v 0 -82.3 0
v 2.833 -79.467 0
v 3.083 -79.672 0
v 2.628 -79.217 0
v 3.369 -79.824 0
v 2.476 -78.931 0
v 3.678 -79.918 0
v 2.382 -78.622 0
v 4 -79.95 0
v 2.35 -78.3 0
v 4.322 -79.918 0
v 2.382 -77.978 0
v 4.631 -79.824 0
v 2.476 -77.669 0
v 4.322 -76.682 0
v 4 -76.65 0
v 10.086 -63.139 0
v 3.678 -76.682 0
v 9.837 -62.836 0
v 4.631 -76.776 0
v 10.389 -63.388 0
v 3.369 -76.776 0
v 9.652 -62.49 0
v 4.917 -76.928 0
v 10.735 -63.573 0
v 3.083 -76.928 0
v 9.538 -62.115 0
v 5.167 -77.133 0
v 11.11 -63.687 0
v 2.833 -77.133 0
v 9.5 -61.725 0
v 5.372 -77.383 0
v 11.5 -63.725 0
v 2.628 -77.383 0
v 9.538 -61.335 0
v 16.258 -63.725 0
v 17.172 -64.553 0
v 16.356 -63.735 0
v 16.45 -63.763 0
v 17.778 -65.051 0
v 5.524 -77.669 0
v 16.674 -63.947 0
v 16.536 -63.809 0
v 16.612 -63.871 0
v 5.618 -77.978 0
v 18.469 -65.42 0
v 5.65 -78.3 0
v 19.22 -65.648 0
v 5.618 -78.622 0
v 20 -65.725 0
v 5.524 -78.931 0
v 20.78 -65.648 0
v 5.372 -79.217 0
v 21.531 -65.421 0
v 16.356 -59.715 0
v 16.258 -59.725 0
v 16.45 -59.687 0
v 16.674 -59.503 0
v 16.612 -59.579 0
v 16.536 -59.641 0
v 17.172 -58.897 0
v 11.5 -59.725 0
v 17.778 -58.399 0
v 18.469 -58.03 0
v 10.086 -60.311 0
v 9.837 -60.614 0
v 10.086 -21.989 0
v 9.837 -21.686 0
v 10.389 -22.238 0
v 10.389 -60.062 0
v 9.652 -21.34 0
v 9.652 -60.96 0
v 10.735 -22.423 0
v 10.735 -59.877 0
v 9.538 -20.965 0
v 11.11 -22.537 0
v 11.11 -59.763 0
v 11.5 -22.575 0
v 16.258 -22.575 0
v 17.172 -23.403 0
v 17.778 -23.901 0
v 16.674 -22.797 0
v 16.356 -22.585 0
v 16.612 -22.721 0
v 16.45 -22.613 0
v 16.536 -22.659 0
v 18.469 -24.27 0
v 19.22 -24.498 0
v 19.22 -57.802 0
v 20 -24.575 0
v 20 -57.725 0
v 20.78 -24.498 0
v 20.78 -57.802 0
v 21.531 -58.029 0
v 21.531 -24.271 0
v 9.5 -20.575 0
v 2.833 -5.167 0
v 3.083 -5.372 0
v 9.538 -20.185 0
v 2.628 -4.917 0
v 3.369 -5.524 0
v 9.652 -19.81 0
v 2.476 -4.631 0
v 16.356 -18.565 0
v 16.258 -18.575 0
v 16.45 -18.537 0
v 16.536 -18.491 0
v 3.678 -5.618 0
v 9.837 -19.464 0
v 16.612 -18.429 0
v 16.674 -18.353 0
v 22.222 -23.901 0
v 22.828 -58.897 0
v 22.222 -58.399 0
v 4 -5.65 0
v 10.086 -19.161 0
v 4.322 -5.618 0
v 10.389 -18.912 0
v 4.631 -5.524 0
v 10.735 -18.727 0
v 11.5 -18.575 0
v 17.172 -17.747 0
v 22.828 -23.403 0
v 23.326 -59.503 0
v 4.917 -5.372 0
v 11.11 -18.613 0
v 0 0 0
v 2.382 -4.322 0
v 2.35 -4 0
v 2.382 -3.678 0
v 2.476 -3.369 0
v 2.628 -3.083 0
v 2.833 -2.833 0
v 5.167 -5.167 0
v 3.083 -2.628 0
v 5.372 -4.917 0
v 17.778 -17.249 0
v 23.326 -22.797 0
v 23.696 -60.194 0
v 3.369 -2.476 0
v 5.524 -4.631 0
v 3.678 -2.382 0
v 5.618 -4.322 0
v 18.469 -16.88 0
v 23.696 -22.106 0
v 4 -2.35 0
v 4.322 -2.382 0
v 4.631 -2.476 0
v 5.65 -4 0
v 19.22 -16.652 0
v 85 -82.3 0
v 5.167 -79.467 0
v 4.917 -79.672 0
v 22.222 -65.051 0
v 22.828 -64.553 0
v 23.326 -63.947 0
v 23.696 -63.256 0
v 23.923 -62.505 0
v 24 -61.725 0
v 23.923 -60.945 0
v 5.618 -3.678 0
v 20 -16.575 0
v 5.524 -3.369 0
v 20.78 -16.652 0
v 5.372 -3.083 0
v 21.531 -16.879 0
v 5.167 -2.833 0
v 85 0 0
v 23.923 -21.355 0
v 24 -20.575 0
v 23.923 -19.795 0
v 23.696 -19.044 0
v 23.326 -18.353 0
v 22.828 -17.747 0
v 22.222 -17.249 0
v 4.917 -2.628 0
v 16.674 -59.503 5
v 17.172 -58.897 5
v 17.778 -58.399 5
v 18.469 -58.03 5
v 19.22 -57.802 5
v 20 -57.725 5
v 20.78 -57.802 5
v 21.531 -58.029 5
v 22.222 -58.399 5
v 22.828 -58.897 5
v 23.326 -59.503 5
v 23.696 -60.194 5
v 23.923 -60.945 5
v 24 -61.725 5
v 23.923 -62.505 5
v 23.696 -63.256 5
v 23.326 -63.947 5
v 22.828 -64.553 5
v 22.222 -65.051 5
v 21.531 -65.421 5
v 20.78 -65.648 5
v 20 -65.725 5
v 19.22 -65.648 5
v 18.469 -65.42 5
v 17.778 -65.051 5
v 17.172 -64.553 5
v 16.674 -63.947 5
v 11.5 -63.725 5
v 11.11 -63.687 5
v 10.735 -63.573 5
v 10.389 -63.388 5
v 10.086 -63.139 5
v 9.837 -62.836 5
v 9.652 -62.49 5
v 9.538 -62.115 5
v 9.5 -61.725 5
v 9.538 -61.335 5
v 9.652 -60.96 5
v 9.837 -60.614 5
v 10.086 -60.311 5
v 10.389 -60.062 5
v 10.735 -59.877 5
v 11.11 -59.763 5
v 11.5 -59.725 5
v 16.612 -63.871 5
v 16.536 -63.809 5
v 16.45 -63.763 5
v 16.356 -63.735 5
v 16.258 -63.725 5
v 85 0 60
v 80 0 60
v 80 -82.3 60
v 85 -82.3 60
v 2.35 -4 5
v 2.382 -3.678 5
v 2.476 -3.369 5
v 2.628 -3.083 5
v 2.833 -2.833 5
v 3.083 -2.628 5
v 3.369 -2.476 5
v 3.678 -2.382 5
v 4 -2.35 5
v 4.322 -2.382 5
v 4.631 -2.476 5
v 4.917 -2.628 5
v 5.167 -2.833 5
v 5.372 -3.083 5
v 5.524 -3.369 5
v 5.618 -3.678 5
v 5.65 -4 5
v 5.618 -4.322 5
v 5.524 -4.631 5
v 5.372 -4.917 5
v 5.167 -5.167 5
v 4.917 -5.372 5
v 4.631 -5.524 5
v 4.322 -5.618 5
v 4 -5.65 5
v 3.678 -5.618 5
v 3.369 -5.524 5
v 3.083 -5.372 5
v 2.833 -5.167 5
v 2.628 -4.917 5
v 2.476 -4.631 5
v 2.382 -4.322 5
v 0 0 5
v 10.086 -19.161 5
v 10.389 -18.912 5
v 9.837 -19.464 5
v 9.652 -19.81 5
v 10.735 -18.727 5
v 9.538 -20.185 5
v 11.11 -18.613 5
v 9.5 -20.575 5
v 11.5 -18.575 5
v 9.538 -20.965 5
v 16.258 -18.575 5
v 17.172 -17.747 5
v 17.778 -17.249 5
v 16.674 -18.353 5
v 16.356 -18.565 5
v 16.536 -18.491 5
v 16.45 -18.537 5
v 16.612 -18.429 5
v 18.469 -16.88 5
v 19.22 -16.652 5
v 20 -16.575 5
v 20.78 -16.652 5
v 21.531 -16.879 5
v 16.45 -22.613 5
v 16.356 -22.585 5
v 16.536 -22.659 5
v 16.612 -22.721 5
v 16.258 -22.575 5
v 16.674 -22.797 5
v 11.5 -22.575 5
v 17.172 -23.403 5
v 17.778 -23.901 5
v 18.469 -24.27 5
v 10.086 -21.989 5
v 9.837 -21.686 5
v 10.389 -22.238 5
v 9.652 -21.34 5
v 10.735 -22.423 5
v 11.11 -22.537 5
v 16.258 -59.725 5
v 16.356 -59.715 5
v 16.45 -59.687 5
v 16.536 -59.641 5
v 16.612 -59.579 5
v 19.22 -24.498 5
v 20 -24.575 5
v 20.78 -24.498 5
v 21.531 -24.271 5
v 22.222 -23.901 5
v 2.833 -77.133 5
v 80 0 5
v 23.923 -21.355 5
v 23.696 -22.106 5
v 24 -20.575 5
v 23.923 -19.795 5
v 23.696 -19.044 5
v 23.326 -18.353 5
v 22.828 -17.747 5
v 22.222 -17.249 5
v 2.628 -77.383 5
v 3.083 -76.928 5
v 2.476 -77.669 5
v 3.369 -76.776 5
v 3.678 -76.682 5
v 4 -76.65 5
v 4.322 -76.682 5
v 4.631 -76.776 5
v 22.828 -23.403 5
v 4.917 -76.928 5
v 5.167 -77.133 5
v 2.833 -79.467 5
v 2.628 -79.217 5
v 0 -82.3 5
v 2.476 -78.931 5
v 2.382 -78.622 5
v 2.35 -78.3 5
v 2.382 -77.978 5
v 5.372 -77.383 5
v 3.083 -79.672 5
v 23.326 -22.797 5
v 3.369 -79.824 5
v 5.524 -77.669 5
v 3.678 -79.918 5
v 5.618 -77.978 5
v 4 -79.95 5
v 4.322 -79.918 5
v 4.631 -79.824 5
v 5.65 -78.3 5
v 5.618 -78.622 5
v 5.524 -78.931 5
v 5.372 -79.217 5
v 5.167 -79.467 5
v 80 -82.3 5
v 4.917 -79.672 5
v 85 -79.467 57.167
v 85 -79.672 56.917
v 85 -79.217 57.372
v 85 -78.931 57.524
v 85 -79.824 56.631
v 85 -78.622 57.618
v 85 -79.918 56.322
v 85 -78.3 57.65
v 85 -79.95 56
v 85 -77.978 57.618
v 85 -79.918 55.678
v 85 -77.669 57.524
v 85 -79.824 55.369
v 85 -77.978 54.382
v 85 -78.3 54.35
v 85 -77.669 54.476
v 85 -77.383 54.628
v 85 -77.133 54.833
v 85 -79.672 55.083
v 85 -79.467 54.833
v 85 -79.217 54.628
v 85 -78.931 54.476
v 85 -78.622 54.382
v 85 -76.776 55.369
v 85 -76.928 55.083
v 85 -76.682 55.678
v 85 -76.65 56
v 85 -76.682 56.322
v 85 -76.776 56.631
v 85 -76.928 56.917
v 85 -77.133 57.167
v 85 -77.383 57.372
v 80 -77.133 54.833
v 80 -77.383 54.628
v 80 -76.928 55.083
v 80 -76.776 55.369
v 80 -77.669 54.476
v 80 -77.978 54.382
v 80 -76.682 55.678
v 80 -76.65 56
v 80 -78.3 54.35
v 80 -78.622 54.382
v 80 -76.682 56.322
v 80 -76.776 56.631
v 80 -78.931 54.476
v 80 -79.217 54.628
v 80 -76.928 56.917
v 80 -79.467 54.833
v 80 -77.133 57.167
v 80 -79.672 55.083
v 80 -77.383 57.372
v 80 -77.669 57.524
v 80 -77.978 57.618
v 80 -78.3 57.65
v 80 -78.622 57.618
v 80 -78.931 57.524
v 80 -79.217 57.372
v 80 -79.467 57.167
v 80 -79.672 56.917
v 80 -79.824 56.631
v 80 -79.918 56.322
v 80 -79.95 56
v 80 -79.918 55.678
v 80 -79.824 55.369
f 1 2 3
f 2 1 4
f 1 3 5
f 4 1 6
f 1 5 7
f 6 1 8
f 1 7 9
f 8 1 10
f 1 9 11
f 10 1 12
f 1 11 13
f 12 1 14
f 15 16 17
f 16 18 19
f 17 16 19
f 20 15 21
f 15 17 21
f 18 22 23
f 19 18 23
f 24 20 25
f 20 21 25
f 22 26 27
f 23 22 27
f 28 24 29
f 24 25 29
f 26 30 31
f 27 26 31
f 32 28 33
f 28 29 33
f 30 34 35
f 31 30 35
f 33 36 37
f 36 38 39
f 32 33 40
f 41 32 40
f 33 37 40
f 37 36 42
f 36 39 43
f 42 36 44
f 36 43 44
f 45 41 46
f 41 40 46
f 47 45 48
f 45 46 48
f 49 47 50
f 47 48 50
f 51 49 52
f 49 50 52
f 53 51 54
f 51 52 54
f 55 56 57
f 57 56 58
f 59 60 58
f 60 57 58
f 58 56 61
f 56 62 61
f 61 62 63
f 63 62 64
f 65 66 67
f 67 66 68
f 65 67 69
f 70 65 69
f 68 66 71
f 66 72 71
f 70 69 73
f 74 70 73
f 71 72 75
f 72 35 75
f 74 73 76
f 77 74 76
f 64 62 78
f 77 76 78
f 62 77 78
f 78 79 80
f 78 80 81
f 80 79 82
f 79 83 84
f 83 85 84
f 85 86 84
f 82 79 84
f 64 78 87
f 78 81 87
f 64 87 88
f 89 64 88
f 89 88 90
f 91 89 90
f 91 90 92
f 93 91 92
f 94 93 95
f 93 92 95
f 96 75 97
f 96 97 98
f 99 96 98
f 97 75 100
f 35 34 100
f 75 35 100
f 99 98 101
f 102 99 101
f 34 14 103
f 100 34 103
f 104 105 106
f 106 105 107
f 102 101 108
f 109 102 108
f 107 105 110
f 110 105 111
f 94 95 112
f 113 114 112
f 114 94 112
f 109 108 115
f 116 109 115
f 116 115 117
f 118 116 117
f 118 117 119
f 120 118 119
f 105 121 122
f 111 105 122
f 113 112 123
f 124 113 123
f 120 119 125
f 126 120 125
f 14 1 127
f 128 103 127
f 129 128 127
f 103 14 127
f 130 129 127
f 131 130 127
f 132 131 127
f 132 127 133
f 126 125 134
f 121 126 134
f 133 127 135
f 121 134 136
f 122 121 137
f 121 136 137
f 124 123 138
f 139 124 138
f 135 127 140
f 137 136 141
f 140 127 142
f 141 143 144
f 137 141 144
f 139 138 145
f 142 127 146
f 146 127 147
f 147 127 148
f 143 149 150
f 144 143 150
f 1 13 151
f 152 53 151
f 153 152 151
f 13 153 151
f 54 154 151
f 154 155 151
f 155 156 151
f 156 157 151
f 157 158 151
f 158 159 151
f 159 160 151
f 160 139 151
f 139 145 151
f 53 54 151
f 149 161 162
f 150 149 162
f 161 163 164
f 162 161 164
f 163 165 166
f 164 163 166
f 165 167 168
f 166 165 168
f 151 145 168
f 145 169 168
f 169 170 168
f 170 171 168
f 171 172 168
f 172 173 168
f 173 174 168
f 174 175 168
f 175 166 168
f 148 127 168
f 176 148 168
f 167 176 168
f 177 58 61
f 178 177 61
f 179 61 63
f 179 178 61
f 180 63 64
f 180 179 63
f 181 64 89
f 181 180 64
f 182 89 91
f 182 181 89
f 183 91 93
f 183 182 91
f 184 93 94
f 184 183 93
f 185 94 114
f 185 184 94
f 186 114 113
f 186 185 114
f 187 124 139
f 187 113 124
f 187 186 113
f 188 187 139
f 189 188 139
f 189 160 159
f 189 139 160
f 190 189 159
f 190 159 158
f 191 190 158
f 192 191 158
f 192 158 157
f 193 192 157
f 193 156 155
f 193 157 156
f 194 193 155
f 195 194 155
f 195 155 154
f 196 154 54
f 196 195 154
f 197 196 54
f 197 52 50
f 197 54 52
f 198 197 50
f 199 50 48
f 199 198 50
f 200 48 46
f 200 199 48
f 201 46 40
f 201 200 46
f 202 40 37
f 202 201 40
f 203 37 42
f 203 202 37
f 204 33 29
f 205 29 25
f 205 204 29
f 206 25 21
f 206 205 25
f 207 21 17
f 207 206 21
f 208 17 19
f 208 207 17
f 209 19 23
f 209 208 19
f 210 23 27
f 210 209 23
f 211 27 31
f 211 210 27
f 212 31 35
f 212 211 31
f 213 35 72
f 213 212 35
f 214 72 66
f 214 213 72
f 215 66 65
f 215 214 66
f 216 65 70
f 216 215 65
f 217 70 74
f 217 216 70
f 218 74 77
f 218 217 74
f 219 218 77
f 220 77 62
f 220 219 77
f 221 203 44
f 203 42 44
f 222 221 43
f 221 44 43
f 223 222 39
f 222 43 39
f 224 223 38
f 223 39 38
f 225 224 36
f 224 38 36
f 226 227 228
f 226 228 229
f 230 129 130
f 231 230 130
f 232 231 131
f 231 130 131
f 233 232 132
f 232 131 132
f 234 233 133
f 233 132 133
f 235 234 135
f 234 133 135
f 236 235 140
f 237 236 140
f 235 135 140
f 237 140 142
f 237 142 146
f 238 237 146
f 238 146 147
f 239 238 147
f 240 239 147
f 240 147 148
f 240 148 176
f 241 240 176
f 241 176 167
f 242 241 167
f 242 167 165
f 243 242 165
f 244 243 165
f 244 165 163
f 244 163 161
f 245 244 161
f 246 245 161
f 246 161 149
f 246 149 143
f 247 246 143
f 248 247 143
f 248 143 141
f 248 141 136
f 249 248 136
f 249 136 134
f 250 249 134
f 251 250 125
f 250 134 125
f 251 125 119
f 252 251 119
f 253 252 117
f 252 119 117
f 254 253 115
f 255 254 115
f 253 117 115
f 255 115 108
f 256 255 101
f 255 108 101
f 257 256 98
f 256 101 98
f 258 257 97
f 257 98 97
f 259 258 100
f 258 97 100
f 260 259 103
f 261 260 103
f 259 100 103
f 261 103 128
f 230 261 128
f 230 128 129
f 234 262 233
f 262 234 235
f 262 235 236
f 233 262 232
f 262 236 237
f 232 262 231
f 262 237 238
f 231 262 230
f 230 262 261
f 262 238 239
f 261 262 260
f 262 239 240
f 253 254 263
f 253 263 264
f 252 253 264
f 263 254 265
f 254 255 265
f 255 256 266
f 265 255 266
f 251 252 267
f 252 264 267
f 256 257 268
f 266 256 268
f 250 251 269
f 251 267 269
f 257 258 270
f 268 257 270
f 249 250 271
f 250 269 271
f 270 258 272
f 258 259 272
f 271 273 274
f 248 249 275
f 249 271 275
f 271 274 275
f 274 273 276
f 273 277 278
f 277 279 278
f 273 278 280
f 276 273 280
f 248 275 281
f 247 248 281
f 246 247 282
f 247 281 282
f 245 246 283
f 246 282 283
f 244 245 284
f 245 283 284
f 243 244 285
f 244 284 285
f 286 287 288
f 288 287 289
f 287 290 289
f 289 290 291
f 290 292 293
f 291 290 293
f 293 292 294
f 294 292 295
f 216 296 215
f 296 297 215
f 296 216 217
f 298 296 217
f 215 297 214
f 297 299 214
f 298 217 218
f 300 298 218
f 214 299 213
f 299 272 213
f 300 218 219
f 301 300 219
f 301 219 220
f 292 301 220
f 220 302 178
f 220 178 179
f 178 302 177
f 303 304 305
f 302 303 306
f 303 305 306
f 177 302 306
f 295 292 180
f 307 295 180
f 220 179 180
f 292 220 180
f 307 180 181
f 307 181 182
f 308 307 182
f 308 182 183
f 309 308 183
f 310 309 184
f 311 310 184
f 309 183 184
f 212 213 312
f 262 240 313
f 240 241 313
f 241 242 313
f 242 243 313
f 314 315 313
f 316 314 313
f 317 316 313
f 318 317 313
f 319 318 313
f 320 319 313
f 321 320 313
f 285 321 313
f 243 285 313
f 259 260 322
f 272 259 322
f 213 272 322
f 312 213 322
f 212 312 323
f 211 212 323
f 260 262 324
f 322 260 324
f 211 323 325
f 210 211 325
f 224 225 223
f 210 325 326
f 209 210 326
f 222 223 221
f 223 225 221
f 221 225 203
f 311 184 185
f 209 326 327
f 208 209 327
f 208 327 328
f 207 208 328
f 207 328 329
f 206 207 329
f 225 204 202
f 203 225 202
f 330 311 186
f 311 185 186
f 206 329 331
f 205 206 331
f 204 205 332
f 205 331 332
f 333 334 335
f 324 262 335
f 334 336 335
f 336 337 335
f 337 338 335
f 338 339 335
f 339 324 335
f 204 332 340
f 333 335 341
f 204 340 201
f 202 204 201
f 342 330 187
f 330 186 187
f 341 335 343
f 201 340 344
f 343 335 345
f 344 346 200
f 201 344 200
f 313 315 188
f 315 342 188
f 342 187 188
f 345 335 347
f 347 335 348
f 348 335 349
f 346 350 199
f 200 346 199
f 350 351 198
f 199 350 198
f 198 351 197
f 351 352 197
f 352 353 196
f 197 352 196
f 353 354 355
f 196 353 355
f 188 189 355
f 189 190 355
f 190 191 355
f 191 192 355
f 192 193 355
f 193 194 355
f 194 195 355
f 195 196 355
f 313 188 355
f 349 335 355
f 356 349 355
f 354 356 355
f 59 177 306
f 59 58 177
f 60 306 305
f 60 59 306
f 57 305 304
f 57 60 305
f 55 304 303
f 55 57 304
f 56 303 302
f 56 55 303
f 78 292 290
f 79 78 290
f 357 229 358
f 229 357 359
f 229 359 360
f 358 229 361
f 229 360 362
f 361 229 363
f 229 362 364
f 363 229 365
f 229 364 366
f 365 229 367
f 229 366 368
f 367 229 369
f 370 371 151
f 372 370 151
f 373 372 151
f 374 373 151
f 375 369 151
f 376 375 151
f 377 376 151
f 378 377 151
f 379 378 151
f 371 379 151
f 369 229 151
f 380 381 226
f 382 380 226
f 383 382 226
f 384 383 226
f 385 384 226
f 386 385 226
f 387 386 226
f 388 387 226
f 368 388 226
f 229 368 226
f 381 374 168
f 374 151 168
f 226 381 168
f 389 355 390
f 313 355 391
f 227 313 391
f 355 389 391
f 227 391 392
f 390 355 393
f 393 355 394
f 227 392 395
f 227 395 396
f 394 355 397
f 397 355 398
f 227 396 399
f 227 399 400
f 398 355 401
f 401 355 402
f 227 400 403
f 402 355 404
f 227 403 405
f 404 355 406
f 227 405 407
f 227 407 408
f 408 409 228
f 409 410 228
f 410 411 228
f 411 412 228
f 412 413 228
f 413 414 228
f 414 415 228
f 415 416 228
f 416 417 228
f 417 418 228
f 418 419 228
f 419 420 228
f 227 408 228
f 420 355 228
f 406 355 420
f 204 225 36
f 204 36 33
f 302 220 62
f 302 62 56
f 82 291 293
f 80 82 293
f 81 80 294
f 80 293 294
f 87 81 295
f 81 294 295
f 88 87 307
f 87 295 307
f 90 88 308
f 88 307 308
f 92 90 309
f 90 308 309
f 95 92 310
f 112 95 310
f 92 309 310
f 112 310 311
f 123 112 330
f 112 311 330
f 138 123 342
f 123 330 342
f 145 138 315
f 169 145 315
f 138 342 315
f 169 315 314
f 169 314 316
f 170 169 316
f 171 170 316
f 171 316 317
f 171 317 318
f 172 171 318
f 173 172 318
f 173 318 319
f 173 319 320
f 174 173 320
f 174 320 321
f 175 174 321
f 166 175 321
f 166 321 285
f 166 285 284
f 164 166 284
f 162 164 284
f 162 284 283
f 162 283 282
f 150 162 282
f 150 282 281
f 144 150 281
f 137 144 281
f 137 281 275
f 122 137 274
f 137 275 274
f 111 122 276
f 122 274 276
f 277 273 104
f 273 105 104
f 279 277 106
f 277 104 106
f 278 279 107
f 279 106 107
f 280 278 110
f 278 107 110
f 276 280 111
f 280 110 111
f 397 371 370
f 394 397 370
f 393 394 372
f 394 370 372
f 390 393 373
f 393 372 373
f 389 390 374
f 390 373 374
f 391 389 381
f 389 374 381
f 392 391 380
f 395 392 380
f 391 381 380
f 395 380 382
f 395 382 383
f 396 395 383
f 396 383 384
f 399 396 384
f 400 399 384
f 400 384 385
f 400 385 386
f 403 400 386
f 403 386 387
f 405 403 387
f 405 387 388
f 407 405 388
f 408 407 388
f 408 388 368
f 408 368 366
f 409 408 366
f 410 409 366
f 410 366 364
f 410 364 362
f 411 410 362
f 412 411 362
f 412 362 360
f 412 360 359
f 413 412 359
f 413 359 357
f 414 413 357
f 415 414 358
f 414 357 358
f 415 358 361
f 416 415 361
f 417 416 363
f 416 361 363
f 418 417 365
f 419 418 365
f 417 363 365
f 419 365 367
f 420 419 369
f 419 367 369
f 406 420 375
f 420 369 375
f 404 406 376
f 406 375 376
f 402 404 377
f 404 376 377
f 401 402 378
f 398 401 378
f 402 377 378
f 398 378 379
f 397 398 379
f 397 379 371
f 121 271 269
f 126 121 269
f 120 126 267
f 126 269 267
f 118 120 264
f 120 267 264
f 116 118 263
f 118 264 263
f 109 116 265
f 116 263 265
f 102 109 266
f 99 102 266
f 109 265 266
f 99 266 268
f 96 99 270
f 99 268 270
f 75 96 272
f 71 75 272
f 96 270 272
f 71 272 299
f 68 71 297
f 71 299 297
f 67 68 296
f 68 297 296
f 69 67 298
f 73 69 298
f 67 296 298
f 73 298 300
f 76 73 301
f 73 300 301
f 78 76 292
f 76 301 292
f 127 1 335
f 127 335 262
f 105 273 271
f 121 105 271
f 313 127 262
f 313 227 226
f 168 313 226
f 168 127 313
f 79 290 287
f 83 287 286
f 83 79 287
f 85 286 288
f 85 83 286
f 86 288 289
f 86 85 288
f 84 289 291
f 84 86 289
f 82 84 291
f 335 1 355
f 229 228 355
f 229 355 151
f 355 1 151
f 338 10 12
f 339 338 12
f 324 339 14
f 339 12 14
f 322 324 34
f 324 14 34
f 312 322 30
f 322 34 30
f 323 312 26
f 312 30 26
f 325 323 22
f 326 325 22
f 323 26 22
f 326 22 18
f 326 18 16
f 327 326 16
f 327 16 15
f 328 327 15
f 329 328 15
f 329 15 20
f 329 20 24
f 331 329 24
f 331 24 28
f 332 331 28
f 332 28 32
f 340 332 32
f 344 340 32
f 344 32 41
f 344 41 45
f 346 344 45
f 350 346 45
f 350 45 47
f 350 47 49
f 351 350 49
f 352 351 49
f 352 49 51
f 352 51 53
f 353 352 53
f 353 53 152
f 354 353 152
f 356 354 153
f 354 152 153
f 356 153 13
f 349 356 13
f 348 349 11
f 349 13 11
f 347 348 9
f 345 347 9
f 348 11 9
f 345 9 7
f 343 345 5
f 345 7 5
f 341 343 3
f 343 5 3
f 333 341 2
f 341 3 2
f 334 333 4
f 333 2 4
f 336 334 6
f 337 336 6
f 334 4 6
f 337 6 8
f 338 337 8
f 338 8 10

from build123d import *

# Parameters (mm, degrees)
SKETCH1_W            = 85
SKETCH1_H            = 82.3
BOSS_EXTRUDE1_DEPTH  = 60
SKETCH2_W            = 80
SKETCH2_H            = 55
CUT_EXTRUDE1_DEPTH   = 83.3
CUT_EXTRUDE2_DEPTH   = 50
FILLET1_R            = 0.5
FILLET1_OF_MIRROR1_R = 0.5
SKETCH4_R            = 1.65
CUT_EXTRUDE3_DEPTH   = 20
SKETCH5_R            = 1.65
CUT_EXTRUDE4_DEPTH   = 20


with BuildPart() as part:
    # Sketch1 → Boss-Extrude1 (new body)
    with BuildSketch(Plane.XY):
        with Locations((42.5, -41.15)):
            Rectangle(SKETCH1_W, SKETCH1_H)
    extrude(amount=BOSS_EXTRUDE1_DEPTH)

    # Sketch2 → Cut-Extrude1 (cut, through all)
    with BuildSketch(Plane.XZ.offset(82.3)):
        with Locations((40, 32.5)):
            Rectangle(SKETCH2_W, SKETCH2_H)
    extrude(amount=-CUT_EXTRUDE1_DEPTH, mode=Mode.SUBTRACT)

    # Sketch3 → Cut-Extrude2 (cut)
    with BuildSketch(Plane.XY.offset(5)):
        with BuildLine():
            Line((16.535898385, -63.725), (11.5, -63.725))
            ThreePointArc((11.5, -63.725), (9.5, -61.725), (11.5, -59.725))
            Line((11.5, -59.725), (16.535898385, -59.725))
            ThreePointArc((16.535898385, -59.725), (24, -61.725), (16.535898385, -63.725))
        make_face()
    cut_extrude2 = extrude(amount=-CUT_EXTRUDE2_DEPTH, mode=Mode.SUBTRACT)

    # Fillet1
    fillet1_edges = [part.edges().sort_by_distance(p)[0] for p in [
        (16.535898385, -59.725, 2.5),
        (16.535898385, -63.725, 2.5),
    ]]
    fillet(fillet1_edges, radius=FILLET1_R)

    # Mirror1: Cut-Extrude2 across plane
    add(cut_extrude2.mirror(Plane(origin=(0, -41.15, 0), x_dir=(0, 0, 1), z_dir=(0, -1, 0))), mode=Mode.SUBTRACT)

    # Fillet1 of Mirror1
    fillet1_of_mirror1_edges = [part.edges().sort_by_distance(p)[0] for p in [
        (16.535898385, -22.575, 2.5),
        (16.535898385, -18.575, 2.5),
    ]]
    fillet(fillet1_of_mirror1_edges, radius=FILLET1_OF_MIRROR1_R)

    # Sketch4 → Cut-Extrude3 (cut)
    with BuildSketch(Plane(origin=(85, 0, 0), x_dir=(0, 0, -1), z_dir=(1, 0, 0))):
        with Locations((-56, -78.3)):
            Circle(SKETCH4_R)
    extrude(amount=-CUT_EXTRUDE3_DEPTH, mode=Mode.SUBTRACT)

    # Sketch5 → Cut-Extrude4 (cut)
    with BuildSketch(Plane(origin=(0, 0, 0), x_dir=(-1, 0, 0), z_dir=(0, 0, -1))):
        with Locations((-4, -4)):
            Circle(SKETCH5_R)
        with Locations((-4, -78.3)):
            Circle(SKETCH5_R)
    extrude(amount=-CUT_EXTRUDE4_DEPTH, mode=Mode.SUBTRACT)


solid = part.part
